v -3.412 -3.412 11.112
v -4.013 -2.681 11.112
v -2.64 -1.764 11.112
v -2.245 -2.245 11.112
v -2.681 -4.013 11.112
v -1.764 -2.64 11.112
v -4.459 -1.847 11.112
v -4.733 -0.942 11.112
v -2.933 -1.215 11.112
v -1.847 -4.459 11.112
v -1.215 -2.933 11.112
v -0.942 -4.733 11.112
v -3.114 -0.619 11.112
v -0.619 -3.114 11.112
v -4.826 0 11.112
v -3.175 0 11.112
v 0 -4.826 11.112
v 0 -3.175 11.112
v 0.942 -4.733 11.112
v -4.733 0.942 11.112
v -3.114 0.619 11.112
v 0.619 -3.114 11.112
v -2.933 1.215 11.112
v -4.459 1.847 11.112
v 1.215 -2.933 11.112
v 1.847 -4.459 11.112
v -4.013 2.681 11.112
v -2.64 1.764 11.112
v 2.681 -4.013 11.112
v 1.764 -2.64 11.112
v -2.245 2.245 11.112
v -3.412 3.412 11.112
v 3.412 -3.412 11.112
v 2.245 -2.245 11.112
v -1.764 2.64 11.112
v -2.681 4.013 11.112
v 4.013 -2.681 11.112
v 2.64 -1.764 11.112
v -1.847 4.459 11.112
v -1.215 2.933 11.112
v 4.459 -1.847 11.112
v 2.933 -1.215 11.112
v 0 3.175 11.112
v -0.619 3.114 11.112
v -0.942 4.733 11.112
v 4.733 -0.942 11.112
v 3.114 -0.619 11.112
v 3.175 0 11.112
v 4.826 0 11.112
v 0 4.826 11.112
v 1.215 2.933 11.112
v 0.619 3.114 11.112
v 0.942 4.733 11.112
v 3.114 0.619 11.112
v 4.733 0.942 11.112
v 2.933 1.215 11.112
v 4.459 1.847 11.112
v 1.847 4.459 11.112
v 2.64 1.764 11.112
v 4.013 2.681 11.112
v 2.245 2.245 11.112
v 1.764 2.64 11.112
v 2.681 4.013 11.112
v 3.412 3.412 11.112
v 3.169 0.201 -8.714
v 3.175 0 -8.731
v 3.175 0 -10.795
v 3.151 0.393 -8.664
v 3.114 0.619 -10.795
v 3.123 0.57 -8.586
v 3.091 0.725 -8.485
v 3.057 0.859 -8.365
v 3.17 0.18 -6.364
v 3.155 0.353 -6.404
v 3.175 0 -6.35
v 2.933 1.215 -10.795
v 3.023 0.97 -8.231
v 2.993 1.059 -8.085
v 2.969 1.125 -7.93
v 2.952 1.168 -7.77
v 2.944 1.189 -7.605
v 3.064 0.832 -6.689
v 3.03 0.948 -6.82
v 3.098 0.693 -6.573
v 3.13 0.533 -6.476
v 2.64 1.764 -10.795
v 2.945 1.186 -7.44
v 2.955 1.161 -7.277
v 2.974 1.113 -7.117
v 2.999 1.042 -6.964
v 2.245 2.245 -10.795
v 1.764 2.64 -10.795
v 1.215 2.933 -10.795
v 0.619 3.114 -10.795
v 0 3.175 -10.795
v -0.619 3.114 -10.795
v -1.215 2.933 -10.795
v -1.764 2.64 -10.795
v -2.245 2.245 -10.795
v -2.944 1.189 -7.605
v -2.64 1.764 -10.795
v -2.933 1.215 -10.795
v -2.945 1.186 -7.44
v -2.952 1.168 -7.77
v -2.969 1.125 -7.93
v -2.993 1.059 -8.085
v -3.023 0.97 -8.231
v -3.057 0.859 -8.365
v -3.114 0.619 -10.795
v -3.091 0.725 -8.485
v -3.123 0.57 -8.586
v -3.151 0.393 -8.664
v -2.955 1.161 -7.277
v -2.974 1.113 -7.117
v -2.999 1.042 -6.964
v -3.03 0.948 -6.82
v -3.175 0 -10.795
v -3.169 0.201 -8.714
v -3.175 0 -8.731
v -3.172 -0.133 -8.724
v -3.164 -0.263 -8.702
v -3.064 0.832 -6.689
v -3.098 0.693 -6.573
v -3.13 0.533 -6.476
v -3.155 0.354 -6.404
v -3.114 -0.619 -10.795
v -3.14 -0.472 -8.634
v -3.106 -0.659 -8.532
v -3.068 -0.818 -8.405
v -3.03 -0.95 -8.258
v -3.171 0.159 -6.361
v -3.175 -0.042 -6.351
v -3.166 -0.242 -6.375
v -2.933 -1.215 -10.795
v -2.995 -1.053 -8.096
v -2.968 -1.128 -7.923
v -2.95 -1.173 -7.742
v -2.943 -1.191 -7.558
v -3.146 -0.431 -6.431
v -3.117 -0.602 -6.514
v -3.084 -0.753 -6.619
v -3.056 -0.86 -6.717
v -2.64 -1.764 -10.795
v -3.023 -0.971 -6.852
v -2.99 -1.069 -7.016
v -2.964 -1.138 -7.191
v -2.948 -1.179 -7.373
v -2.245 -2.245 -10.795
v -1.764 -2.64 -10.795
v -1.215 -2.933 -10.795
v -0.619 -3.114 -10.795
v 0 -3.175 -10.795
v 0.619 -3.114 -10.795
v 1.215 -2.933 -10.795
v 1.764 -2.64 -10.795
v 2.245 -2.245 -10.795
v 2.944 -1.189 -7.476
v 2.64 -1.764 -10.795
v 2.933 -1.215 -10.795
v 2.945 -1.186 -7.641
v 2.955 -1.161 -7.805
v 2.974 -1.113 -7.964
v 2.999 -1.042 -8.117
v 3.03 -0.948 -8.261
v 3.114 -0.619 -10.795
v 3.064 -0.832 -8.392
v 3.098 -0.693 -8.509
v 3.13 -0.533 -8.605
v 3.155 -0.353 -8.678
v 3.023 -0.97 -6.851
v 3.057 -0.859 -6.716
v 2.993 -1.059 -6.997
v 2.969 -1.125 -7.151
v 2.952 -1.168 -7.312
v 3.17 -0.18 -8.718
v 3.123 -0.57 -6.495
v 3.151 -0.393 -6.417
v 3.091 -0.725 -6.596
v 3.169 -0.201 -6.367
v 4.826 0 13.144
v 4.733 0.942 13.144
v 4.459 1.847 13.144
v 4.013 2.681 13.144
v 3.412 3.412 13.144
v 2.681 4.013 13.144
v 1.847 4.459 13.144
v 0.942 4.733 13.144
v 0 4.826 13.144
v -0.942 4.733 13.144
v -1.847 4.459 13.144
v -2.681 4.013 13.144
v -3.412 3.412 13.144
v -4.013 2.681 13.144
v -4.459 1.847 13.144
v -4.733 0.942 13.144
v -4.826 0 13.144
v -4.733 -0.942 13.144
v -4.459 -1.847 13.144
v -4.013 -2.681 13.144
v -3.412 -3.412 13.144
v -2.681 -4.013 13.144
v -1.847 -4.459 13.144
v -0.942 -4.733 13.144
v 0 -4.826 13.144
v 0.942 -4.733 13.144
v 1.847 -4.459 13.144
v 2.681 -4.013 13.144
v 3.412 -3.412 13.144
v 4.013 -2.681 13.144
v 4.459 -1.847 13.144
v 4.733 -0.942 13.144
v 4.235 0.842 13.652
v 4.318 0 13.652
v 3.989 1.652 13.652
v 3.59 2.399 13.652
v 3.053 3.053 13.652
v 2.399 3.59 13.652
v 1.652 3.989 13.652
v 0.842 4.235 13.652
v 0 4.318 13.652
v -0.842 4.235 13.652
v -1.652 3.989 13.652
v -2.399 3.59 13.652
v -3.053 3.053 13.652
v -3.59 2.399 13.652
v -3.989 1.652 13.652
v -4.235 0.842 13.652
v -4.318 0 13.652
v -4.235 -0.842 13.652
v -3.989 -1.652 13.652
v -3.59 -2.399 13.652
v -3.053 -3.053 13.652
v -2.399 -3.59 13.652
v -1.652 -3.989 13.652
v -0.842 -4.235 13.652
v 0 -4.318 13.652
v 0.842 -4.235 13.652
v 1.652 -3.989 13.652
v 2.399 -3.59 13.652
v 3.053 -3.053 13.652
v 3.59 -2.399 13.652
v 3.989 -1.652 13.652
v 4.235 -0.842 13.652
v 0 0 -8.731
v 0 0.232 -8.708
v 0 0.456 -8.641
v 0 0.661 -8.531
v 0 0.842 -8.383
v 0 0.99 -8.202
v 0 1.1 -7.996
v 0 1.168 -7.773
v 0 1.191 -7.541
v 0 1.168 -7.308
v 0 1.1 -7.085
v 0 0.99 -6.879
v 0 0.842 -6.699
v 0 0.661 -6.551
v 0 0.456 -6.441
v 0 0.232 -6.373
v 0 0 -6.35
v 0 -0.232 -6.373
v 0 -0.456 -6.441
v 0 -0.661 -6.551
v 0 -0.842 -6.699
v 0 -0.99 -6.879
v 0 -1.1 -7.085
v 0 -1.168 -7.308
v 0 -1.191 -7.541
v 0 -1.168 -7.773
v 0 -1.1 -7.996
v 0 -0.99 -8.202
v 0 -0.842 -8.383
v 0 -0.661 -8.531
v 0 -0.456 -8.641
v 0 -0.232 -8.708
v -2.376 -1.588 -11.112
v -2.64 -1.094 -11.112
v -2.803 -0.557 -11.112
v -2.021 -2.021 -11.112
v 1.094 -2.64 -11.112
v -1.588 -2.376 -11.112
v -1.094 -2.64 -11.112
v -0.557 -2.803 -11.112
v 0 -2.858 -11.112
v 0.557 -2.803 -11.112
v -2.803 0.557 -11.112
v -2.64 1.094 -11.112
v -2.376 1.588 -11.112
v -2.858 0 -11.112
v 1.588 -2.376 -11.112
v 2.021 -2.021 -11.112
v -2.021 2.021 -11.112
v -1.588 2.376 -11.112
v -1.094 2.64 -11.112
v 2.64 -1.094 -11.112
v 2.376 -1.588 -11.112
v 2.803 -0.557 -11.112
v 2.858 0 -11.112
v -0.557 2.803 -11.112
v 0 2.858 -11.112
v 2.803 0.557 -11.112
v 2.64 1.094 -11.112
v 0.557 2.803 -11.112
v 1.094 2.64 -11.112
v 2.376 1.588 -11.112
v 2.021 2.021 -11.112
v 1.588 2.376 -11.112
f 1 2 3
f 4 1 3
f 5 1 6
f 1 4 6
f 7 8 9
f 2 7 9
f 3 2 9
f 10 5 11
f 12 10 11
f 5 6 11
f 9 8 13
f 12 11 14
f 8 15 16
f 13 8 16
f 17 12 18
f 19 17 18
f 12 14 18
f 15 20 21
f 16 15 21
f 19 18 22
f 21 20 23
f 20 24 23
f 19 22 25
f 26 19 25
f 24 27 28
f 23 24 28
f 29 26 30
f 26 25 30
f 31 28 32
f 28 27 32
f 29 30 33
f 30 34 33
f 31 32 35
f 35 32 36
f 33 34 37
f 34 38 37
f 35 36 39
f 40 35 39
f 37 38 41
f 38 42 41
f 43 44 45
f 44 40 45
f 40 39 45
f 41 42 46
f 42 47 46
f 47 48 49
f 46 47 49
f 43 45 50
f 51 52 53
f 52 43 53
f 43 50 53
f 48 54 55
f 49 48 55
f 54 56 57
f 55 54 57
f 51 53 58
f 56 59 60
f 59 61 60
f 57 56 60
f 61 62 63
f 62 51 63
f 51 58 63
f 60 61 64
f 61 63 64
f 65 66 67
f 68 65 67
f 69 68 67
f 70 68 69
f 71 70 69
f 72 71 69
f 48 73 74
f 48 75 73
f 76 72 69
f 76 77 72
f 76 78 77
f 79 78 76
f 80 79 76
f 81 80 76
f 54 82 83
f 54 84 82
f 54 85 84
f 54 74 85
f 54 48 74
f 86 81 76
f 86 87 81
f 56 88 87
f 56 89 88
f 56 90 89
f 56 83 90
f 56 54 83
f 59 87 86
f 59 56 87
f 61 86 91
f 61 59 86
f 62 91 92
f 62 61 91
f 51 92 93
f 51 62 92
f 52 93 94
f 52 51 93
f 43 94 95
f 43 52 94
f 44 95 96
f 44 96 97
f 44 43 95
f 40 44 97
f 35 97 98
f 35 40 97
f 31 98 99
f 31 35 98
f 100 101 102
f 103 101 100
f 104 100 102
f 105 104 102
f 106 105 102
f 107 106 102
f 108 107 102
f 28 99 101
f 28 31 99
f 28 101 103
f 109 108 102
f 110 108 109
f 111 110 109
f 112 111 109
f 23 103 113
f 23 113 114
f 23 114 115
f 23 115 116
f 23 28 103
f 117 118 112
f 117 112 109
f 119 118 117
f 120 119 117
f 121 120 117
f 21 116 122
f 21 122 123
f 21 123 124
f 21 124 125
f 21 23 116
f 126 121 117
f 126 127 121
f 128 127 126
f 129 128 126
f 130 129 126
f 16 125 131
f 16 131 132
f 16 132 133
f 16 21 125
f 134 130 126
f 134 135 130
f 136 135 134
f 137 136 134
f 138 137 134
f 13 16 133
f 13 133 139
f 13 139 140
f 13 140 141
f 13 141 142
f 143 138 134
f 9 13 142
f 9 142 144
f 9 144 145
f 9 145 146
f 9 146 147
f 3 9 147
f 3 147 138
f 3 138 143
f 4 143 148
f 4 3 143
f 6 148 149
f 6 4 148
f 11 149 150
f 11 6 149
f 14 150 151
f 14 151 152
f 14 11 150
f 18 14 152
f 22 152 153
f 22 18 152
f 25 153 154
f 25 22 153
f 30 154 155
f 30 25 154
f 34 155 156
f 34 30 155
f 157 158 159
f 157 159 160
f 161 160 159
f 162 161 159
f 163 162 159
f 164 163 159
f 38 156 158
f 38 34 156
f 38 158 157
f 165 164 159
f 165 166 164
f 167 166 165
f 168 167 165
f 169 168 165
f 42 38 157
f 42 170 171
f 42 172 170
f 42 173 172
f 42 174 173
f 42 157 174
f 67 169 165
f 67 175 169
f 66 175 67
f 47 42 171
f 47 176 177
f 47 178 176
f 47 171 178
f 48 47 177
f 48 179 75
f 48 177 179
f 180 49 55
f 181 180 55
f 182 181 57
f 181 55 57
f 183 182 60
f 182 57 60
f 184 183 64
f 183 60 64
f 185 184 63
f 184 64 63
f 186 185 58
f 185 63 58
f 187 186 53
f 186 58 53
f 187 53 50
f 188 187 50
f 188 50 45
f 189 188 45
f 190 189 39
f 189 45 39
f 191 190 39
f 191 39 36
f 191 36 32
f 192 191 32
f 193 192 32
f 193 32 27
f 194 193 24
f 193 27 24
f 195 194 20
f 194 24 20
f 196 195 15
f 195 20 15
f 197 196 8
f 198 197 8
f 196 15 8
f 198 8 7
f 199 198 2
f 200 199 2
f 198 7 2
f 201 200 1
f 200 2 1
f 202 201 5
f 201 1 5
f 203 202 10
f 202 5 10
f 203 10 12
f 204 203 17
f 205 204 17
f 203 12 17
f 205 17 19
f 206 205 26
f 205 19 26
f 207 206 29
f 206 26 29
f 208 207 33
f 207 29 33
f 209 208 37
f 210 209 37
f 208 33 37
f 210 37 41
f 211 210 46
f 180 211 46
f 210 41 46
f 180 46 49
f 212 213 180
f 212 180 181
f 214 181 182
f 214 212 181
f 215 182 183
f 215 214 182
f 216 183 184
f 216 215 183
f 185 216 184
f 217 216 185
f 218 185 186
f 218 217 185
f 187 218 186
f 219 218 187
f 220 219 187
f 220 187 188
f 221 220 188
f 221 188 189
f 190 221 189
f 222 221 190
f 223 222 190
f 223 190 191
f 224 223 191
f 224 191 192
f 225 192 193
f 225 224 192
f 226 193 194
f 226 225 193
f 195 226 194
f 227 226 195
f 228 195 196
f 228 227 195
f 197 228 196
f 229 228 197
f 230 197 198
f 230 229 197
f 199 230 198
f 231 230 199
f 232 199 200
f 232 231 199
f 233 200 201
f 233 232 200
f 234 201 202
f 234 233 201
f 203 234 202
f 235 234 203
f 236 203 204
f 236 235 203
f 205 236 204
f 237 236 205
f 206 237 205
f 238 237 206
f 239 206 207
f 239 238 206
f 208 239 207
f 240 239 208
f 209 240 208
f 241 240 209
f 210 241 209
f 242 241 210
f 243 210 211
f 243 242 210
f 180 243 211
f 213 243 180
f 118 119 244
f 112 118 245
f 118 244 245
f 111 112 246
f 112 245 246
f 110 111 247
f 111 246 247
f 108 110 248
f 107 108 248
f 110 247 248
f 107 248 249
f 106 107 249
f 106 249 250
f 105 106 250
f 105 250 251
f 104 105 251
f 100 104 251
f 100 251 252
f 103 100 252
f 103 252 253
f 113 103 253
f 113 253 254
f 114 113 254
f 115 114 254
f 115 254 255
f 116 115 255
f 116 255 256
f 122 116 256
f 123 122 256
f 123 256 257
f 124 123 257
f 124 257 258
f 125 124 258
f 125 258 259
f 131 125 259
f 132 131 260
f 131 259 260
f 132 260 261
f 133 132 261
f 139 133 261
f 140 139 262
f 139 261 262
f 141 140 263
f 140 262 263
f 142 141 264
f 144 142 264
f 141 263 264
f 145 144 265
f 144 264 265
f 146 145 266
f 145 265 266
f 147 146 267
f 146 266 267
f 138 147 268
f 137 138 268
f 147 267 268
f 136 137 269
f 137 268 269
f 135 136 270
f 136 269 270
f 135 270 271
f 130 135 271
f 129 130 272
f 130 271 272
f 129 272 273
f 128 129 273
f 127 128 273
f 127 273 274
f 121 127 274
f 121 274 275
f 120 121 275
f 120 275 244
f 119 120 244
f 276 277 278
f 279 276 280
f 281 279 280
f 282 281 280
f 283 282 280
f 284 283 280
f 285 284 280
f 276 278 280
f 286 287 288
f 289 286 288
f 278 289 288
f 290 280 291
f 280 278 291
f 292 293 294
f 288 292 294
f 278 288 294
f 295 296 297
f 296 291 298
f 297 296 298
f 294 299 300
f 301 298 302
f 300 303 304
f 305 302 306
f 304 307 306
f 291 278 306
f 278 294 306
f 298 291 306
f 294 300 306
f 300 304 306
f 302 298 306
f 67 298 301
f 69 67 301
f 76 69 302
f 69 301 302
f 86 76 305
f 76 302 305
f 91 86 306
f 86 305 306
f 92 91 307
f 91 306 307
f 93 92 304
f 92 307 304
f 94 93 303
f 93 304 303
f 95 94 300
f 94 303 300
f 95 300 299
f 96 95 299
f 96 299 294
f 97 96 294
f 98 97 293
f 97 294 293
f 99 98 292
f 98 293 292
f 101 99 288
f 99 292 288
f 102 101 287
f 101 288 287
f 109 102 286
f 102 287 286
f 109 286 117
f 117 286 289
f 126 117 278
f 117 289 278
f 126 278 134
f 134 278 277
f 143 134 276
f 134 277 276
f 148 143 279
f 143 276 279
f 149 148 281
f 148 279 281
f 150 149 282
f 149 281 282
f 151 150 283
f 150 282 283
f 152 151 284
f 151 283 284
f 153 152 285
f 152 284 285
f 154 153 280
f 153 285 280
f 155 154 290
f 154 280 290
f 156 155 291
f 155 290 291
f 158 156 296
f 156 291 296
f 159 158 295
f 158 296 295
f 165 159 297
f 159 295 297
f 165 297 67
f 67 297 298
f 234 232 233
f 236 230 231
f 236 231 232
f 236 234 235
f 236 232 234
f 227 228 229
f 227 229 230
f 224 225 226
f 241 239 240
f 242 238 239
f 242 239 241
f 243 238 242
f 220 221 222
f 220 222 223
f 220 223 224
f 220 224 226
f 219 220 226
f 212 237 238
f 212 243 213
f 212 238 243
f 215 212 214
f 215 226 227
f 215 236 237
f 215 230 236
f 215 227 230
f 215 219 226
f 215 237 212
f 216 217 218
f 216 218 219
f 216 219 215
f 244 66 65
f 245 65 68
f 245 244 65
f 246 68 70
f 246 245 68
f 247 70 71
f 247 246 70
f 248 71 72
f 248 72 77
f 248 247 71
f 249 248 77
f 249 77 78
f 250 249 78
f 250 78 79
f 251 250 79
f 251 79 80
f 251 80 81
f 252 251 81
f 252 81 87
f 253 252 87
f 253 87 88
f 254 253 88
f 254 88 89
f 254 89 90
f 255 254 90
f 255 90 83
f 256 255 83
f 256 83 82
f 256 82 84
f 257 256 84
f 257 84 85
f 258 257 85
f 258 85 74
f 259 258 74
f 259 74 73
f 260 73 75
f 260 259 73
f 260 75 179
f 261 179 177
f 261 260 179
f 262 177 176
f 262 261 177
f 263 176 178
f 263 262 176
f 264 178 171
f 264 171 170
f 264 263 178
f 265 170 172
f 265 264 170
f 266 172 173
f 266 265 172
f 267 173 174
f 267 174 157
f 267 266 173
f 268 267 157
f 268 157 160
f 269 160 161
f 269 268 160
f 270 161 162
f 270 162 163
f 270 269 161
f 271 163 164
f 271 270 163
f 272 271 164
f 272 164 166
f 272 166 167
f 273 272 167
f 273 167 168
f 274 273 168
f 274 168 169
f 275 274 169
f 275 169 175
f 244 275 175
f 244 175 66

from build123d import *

# Parameters (mm, degrees)
SKETCH1_R           = 3.175
EXTRUDE1_DEPTH      = 11.1125
SKETCH2_R           = 4.826
EXTRUDE2_DEPTH      = 2.54
CHAMFER1_SIZE       = 0.508
SKETCH3_R           = 1.190625
EXTRUDE3_DEPTH      = 5.826
EXTRUDE3_DEPTH_BACK = 5.826
CHAMFER2_SIZE       = 0.3175


with BuildPart() as part:
    # Sketch1 → Extrude1 (new body, symmetric)
    with BuildSketch(Plane.XY):
        Circle(SKETCH1_R)
    extrude(amount=EXTRUDE1_DEPTH, both=True)

    # Sketch2 → Extrude2 (add)
    with BuildSketch(Plane.XY.offset(11.1125)):
        Circle(SKETCH2_R)
    extrude(amount=EXTRUDE2_DEPTH)

    # Chamfer1
    chamfer1_edges = [part.edges().sort_by_distance(p)[0] for p in [
        (-4.826, 0, 13.6525),
    ]]
    chamfer(chamfer1_edges, length=CHAMFER1_SIZE)

    # Sketch3 → Extrude3 (cut, two sides)
    with BuildSketch(Plane(origin=(0, 0, 0), x_dir=(0, 0, -1), z_dir=(1, 0, 0))) as extrude3_sk:
        with Locations((7.540625, 0)):
            Circle(SKETCH3_R)
    extrude(amount=EXTRUDE3_DEPTH, mode=Mode.SUBTRACT)
    extrude(extrude3_sk.sketch, amount=-EXTRUDE3_DEPTH_BACK, mode=Mode.SUBTRACT)

    # Chamfer2
    chamfer2_edges = [part.edges().sort_by_distance(p)[0] for p in [
        (-3.175, 0, -11.1125),
    ]]
    chamfer(chamfer2_edges, length=CHAMFER2_SIZE)


solid = part.part
